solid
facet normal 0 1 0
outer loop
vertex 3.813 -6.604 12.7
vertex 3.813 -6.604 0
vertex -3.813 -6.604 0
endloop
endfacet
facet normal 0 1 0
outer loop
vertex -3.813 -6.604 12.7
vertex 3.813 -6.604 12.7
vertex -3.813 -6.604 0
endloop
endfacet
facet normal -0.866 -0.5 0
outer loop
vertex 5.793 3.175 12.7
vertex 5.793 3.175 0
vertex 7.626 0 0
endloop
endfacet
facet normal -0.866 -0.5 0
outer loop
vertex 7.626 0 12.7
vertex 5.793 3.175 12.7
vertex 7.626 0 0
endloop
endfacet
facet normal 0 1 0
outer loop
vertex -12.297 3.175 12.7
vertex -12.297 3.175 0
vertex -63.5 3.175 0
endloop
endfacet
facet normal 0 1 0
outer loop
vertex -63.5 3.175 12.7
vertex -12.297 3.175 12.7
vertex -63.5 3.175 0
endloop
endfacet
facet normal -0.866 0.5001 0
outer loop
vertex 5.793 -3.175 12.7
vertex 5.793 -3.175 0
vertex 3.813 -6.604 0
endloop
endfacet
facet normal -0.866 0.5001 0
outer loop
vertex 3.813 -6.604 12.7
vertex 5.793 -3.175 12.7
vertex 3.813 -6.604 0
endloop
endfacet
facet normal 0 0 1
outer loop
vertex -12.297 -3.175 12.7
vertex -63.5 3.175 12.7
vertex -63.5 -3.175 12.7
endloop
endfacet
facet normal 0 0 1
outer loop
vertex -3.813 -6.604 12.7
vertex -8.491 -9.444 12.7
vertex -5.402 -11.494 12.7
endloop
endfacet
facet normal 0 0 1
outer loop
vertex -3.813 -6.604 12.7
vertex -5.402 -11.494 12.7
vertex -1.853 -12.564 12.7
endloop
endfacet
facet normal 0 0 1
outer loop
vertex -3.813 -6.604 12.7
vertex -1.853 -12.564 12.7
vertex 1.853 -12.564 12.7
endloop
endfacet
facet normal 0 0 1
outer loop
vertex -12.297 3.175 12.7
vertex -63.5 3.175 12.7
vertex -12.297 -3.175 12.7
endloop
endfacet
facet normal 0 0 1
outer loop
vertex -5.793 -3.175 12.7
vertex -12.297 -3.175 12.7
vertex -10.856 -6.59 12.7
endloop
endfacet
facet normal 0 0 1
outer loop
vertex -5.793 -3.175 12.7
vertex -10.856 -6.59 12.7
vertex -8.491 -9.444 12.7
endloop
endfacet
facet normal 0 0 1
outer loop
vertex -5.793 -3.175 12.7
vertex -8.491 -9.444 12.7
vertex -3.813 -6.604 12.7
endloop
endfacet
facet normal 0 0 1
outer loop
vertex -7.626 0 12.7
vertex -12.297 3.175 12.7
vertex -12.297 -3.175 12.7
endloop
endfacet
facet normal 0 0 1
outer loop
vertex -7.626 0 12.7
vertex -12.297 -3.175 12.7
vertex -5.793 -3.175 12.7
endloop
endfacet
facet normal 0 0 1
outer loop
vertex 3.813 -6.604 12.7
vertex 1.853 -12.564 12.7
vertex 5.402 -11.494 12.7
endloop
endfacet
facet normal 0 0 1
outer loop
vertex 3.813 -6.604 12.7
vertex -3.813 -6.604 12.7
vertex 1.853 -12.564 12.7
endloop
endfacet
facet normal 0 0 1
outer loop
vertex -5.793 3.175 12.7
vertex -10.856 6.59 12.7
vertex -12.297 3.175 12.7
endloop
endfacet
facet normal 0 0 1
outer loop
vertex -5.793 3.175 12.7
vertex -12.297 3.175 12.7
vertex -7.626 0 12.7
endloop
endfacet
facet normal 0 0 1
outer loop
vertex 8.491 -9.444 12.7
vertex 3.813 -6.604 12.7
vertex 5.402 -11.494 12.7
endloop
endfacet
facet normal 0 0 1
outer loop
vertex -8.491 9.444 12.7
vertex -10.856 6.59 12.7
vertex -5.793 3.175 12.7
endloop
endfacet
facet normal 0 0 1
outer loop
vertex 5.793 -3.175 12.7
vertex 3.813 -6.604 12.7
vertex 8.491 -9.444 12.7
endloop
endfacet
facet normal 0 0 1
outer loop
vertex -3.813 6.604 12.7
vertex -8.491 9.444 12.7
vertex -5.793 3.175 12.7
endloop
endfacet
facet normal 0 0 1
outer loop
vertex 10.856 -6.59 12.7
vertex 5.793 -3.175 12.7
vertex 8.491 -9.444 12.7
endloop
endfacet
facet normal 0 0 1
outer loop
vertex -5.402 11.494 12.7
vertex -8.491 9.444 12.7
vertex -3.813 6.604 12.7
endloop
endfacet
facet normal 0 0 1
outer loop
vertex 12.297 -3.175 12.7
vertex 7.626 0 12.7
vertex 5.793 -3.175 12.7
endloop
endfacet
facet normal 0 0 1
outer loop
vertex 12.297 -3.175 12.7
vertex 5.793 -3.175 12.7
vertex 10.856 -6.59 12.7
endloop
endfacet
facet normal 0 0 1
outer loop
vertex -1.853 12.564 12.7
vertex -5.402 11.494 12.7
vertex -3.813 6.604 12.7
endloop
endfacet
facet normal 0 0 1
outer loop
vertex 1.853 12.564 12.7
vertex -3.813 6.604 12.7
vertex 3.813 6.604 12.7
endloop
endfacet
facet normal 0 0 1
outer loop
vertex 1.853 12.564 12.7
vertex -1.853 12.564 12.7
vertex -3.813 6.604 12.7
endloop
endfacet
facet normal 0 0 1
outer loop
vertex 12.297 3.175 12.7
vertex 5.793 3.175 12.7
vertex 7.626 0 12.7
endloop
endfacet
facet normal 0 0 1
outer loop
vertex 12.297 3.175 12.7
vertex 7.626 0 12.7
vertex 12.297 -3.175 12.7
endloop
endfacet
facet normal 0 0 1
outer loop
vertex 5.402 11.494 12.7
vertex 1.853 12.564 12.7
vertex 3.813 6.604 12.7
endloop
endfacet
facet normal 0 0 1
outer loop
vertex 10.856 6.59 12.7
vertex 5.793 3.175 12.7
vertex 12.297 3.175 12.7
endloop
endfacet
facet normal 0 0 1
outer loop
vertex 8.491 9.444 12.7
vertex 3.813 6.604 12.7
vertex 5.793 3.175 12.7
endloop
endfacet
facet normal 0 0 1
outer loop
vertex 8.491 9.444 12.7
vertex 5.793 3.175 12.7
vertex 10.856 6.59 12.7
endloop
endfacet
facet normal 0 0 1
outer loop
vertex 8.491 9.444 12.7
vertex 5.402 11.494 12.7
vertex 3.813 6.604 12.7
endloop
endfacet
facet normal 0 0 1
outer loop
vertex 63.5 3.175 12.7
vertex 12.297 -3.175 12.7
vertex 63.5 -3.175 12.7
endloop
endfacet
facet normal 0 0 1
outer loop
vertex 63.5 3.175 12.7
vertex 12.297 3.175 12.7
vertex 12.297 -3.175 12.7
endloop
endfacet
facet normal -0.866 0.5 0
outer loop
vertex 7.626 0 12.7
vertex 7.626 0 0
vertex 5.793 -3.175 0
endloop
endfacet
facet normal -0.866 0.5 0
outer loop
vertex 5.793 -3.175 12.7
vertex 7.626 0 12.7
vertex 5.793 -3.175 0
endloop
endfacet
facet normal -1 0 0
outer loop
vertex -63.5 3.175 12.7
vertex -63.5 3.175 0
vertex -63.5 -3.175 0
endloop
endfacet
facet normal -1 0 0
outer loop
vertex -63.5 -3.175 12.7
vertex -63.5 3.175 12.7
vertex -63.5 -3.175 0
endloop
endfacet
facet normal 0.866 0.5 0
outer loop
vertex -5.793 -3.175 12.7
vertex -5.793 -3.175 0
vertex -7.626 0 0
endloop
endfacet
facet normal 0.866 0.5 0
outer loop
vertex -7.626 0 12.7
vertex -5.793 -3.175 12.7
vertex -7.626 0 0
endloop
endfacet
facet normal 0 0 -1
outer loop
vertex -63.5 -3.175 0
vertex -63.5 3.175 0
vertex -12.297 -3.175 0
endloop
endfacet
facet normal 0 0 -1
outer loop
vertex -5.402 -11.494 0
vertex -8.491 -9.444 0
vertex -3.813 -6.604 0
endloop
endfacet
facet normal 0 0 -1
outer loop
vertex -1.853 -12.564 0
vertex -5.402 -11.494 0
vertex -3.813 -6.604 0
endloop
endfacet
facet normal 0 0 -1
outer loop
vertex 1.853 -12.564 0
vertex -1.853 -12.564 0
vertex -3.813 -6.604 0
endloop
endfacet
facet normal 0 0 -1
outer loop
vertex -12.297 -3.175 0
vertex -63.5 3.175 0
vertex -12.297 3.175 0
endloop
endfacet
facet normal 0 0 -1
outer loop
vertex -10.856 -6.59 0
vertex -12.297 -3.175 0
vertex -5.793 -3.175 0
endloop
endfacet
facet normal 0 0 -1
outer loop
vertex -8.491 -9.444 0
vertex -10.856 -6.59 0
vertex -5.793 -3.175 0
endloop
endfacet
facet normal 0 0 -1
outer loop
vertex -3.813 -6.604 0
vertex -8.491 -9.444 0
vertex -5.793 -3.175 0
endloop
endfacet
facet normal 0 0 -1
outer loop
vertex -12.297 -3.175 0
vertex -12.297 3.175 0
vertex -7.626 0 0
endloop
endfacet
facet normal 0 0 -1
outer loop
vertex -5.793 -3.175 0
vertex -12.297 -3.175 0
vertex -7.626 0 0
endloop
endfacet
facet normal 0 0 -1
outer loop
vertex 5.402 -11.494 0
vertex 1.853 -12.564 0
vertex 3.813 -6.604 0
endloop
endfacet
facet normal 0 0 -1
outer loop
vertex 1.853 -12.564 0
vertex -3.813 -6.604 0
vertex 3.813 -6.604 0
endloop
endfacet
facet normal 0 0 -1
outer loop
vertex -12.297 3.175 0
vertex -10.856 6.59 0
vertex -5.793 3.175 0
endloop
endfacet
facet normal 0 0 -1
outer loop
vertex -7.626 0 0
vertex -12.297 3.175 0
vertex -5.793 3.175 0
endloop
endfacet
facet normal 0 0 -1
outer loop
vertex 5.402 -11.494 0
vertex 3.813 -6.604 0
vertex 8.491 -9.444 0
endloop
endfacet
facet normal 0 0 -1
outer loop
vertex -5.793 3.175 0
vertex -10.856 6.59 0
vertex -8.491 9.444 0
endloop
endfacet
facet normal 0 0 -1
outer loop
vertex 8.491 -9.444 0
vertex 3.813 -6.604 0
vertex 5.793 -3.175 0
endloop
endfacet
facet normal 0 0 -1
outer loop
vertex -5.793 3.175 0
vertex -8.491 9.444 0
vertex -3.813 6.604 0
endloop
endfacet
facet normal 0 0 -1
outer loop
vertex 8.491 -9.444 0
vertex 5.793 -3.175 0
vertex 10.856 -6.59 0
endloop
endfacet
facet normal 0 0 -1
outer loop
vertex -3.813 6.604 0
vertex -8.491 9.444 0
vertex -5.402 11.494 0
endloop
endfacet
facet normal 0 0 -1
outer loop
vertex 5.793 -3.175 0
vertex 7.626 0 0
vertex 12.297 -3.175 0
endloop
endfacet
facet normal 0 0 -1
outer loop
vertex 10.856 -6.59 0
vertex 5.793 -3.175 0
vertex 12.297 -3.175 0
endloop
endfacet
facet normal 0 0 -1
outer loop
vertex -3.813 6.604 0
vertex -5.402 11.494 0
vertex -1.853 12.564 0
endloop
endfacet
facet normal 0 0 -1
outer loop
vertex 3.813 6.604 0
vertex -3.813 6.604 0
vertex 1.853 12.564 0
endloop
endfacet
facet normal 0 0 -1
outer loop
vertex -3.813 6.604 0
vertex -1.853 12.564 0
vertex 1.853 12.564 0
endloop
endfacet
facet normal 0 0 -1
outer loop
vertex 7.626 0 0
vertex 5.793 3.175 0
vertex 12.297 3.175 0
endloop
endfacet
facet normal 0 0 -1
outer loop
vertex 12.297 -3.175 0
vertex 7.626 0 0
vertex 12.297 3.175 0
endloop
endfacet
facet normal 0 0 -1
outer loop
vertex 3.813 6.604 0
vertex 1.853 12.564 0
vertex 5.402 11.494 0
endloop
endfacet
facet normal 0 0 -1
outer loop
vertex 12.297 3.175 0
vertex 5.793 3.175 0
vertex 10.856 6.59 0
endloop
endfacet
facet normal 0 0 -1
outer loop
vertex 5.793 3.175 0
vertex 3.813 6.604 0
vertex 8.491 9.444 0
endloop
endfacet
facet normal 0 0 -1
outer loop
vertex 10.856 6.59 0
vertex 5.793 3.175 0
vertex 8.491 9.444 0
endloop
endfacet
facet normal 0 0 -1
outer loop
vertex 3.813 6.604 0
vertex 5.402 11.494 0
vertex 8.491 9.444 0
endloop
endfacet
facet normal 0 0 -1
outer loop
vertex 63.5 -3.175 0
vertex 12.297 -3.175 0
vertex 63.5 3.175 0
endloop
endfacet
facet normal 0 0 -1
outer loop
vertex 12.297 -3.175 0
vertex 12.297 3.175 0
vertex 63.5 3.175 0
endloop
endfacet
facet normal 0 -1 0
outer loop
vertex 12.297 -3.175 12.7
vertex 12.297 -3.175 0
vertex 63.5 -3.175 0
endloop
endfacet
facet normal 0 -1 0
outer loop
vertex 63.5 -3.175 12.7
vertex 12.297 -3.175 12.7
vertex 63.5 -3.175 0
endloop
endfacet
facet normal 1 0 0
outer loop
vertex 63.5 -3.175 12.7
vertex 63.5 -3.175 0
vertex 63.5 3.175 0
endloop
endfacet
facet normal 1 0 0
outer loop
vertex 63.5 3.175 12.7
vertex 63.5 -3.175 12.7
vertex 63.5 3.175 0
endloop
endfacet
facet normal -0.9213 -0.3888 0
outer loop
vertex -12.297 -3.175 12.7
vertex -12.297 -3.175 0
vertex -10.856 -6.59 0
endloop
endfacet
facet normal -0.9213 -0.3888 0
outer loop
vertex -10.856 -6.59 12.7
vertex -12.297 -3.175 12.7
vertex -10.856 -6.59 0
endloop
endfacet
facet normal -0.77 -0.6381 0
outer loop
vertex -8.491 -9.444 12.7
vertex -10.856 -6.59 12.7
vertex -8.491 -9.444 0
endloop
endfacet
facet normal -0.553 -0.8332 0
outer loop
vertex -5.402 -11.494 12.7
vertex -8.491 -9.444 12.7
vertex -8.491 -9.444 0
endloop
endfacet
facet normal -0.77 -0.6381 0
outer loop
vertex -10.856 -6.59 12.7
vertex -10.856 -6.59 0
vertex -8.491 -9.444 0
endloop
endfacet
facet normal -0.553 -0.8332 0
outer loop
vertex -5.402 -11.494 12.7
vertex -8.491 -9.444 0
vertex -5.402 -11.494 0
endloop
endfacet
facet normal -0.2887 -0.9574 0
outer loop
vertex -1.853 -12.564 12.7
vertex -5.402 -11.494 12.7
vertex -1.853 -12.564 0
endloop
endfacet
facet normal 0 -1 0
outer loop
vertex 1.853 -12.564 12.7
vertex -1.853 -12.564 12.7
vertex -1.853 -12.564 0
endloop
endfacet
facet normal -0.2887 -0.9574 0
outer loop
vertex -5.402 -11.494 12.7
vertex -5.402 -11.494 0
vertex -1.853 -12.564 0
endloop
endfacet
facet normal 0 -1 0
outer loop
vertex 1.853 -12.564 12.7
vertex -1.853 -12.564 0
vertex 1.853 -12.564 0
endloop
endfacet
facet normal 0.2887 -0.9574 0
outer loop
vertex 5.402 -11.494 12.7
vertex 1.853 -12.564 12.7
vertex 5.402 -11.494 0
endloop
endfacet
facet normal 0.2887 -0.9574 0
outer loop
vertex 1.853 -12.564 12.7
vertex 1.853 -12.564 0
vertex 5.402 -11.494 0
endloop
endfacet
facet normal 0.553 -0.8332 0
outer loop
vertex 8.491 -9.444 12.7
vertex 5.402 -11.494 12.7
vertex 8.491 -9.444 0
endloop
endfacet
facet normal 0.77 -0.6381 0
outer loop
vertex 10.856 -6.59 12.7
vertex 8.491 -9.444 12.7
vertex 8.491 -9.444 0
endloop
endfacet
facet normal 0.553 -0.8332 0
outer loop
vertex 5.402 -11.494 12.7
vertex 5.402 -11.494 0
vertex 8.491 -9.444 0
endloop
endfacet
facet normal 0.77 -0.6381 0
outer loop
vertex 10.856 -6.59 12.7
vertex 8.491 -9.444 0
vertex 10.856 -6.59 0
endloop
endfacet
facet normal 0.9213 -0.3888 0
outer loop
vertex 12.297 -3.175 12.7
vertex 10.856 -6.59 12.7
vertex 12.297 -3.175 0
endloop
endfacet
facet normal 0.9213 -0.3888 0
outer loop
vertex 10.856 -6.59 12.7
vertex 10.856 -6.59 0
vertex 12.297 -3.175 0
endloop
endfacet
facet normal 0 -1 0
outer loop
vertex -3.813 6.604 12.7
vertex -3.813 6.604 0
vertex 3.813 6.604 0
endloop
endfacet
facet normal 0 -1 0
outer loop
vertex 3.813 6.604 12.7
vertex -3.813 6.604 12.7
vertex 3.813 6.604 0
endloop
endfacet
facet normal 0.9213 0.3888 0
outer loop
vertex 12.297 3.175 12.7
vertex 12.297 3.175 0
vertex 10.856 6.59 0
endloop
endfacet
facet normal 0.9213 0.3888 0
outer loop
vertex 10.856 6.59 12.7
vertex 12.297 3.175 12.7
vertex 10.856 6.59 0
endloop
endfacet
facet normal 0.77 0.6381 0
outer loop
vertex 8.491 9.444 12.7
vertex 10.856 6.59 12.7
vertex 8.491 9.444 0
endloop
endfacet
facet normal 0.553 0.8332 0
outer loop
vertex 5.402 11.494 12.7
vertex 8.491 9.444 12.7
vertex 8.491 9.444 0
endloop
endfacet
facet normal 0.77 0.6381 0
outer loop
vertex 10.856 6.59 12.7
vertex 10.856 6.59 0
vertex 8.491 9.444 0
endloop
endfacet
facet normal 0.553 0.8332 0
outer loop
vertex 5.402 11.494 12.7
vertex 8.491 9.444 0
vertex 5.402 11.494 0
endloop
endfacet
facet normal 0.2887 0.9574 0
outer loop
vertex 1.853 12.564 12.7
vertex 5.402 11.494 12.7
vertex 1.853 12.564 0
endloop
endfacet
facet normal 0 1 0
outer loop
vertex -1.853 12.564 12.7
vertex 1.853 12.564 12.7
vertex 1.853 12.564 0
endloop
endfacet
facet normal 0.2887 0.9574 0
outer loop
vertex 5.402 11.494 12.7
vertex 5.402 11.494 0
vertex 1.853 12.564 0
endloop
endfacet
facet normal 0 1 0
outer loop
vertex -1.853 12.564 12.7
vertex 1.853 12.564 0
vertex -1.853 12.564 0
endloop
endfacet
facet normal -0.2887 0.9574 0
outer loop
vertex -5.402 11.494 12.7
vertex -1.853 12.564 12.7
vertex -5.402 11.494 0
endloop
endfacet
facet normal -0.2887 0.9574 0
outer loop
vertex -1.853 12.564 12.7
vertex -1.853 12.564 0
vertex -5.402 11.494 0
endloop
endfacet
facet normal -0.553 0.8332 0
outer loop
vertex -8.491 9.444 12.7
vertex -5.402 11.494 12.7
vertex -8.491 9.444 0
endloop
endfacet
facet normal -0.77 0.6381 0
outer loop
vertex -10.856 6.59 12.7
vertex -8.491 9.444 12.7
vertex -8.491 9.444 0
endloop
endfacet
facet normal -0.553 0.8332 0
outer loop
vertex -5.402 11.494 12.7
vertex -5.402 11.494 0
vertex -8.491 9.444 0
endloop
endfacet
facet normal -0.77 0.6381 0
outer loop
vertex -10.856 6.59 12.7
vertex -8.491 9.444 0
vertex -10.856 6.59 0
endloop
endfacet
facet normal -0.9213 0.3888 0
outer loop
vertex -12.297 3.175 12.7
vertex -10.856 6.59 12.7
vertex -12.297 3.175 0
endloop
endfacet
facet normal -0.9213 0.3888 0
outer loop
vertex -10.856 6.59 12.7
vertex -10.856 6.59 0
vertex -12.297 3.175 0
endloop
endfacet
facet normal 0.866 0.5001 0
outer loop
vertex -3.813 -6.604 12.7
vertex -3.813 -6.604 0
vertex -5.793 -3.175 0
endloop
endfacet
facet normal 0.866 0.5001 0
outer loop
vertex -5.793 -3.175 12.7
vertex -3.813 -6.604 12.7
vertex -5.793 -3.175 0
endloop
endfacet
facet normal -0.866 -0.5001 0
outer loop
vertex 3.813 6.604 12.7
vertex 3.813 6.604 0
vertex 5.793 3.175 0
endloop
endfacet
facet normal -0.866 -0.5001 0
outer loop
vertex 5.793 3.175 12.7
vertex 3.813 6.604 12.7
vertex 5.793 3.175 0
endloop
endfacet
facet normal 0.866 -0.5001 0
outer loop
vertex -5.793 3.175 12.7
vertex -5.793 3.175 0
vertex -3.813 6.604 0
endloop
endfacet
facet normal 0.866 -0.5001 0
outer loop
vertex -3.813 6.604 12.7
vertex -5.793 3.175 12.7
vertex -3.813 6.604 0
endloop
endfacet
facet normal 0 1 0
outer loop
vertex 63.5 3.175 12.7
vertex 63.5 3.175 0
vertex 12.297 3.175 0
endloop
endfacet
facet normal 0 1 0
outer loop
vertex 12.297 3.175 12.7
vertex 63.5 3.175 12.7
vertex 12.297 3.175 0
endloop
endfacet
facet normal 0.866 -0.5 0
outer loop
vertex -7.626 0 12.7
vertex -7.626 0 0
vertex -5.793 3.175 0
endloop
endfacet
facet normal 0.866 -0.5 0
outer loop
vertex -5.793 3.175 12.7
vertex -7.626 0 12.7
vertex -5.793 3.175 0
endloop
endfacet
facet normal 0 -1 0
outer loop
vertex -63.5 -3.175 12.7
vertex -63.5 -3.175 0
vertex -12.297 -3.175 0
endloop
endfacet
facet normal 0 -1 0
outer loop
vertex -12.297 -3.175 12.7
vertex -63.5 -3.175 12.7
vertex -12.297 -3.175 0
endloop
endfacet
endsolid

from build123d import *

# Parameters (mm, degrees)
F1_DEPTH = 12.7


with BuildPart() as f1:
    # F0 (on Top) → F1 (new body)
    with BuildSketch(Plane.XY):
        with BuildLine():
            ThreePointArc((-12.296722, -3.175), (-12.7, 0), (-12.296722, 3.175))
            Line((-12.296722, 3.175), (-63.5, 3.175))
            Line((-63.5, 3.175), (-63.5, -3.175))
            Line((-63.5, -3.175), (-12.296722, -3.175))
        make_face()
        with BuildLine():
            Line((-7.625642, 0), (-5.792555, 3.175))
            Line((-5.792555, 3.175), (-12.296722, 3.175))
            ThreePointArc((-12.296722, 3.175), (-12.7, 0), (-12.296722, -3.175))
            Line((-12.296722, -3.175), (-5.792555, -3.175))
            Line((-5.792555, -3.175), (-7.625642, 0))
        make_face()
        with BuildLine():
            Line((-3.812821, 6.604), (3.812821, 6.604))
            Line((3.812821, 6.604), (5.792555, 3.175))
            Line((5.792555, 3.175), (12.296722, 3.175))
            ThreePointArc((12.296722, 3.175), (0, 12.7), (-12.296722, 3.175))
            Line((-12.296722, 3.175), (-5.792555, 3.175))
            Line((-5.792555, 3.175), (-3.812821, 6.604))
        make_face()
        with BuildLine():
            Line((12.296722, 3.175), (5.792555, 3.175))
            Line((5.792555, 3.175), (7.625642, 0))
            Line((7.625642, 0), (5.792555, -3.175))
            Line((5.792555, -3.175), (12.296722, -3.175))
            ThreePointArc((12.296722, -3.175), (12.598777, -1.600255), (12.7, 0))
            ThreePointArc((12.7, 0), (12.598777, 1.600255), (12.296722, 3.175))
        make_face()
        with BuildLine():
            Line((12.296722, -3.175), (5.792555, -3.175))
            Line((5.792555, -3.175), (3.812821, -6.604))
            Line((3.812821, -6.604), (-3.812821, -6.604))
            Line((-3.812821, -6.604), (-5.792555, -3.175))
            Line((-5.792555, -3.175), (-12.296722, -3.175))
            ThreePointArc((-12.296722, -3.175), (0, -12.7), (12.296722, -3.175))
        make_face()
        with BuildLine():
            Line((63.5, 3.175), (12.296722, 3.175))
            ThreePointArc((12.296722, 3.175), (12.598777, 1.600255), (12.7, 0))
            ThreePointArc((12.7, 0), (12.598777, -1.600255), (12.296722, -3.175))
            Line((12.296722, -3.175), (63.5, -3.175))
            Line((63.5, -3.175), (63.5, 3.175))
        make_face()
    extrude(amount=F1_DEPTH)


solid = f1.part
